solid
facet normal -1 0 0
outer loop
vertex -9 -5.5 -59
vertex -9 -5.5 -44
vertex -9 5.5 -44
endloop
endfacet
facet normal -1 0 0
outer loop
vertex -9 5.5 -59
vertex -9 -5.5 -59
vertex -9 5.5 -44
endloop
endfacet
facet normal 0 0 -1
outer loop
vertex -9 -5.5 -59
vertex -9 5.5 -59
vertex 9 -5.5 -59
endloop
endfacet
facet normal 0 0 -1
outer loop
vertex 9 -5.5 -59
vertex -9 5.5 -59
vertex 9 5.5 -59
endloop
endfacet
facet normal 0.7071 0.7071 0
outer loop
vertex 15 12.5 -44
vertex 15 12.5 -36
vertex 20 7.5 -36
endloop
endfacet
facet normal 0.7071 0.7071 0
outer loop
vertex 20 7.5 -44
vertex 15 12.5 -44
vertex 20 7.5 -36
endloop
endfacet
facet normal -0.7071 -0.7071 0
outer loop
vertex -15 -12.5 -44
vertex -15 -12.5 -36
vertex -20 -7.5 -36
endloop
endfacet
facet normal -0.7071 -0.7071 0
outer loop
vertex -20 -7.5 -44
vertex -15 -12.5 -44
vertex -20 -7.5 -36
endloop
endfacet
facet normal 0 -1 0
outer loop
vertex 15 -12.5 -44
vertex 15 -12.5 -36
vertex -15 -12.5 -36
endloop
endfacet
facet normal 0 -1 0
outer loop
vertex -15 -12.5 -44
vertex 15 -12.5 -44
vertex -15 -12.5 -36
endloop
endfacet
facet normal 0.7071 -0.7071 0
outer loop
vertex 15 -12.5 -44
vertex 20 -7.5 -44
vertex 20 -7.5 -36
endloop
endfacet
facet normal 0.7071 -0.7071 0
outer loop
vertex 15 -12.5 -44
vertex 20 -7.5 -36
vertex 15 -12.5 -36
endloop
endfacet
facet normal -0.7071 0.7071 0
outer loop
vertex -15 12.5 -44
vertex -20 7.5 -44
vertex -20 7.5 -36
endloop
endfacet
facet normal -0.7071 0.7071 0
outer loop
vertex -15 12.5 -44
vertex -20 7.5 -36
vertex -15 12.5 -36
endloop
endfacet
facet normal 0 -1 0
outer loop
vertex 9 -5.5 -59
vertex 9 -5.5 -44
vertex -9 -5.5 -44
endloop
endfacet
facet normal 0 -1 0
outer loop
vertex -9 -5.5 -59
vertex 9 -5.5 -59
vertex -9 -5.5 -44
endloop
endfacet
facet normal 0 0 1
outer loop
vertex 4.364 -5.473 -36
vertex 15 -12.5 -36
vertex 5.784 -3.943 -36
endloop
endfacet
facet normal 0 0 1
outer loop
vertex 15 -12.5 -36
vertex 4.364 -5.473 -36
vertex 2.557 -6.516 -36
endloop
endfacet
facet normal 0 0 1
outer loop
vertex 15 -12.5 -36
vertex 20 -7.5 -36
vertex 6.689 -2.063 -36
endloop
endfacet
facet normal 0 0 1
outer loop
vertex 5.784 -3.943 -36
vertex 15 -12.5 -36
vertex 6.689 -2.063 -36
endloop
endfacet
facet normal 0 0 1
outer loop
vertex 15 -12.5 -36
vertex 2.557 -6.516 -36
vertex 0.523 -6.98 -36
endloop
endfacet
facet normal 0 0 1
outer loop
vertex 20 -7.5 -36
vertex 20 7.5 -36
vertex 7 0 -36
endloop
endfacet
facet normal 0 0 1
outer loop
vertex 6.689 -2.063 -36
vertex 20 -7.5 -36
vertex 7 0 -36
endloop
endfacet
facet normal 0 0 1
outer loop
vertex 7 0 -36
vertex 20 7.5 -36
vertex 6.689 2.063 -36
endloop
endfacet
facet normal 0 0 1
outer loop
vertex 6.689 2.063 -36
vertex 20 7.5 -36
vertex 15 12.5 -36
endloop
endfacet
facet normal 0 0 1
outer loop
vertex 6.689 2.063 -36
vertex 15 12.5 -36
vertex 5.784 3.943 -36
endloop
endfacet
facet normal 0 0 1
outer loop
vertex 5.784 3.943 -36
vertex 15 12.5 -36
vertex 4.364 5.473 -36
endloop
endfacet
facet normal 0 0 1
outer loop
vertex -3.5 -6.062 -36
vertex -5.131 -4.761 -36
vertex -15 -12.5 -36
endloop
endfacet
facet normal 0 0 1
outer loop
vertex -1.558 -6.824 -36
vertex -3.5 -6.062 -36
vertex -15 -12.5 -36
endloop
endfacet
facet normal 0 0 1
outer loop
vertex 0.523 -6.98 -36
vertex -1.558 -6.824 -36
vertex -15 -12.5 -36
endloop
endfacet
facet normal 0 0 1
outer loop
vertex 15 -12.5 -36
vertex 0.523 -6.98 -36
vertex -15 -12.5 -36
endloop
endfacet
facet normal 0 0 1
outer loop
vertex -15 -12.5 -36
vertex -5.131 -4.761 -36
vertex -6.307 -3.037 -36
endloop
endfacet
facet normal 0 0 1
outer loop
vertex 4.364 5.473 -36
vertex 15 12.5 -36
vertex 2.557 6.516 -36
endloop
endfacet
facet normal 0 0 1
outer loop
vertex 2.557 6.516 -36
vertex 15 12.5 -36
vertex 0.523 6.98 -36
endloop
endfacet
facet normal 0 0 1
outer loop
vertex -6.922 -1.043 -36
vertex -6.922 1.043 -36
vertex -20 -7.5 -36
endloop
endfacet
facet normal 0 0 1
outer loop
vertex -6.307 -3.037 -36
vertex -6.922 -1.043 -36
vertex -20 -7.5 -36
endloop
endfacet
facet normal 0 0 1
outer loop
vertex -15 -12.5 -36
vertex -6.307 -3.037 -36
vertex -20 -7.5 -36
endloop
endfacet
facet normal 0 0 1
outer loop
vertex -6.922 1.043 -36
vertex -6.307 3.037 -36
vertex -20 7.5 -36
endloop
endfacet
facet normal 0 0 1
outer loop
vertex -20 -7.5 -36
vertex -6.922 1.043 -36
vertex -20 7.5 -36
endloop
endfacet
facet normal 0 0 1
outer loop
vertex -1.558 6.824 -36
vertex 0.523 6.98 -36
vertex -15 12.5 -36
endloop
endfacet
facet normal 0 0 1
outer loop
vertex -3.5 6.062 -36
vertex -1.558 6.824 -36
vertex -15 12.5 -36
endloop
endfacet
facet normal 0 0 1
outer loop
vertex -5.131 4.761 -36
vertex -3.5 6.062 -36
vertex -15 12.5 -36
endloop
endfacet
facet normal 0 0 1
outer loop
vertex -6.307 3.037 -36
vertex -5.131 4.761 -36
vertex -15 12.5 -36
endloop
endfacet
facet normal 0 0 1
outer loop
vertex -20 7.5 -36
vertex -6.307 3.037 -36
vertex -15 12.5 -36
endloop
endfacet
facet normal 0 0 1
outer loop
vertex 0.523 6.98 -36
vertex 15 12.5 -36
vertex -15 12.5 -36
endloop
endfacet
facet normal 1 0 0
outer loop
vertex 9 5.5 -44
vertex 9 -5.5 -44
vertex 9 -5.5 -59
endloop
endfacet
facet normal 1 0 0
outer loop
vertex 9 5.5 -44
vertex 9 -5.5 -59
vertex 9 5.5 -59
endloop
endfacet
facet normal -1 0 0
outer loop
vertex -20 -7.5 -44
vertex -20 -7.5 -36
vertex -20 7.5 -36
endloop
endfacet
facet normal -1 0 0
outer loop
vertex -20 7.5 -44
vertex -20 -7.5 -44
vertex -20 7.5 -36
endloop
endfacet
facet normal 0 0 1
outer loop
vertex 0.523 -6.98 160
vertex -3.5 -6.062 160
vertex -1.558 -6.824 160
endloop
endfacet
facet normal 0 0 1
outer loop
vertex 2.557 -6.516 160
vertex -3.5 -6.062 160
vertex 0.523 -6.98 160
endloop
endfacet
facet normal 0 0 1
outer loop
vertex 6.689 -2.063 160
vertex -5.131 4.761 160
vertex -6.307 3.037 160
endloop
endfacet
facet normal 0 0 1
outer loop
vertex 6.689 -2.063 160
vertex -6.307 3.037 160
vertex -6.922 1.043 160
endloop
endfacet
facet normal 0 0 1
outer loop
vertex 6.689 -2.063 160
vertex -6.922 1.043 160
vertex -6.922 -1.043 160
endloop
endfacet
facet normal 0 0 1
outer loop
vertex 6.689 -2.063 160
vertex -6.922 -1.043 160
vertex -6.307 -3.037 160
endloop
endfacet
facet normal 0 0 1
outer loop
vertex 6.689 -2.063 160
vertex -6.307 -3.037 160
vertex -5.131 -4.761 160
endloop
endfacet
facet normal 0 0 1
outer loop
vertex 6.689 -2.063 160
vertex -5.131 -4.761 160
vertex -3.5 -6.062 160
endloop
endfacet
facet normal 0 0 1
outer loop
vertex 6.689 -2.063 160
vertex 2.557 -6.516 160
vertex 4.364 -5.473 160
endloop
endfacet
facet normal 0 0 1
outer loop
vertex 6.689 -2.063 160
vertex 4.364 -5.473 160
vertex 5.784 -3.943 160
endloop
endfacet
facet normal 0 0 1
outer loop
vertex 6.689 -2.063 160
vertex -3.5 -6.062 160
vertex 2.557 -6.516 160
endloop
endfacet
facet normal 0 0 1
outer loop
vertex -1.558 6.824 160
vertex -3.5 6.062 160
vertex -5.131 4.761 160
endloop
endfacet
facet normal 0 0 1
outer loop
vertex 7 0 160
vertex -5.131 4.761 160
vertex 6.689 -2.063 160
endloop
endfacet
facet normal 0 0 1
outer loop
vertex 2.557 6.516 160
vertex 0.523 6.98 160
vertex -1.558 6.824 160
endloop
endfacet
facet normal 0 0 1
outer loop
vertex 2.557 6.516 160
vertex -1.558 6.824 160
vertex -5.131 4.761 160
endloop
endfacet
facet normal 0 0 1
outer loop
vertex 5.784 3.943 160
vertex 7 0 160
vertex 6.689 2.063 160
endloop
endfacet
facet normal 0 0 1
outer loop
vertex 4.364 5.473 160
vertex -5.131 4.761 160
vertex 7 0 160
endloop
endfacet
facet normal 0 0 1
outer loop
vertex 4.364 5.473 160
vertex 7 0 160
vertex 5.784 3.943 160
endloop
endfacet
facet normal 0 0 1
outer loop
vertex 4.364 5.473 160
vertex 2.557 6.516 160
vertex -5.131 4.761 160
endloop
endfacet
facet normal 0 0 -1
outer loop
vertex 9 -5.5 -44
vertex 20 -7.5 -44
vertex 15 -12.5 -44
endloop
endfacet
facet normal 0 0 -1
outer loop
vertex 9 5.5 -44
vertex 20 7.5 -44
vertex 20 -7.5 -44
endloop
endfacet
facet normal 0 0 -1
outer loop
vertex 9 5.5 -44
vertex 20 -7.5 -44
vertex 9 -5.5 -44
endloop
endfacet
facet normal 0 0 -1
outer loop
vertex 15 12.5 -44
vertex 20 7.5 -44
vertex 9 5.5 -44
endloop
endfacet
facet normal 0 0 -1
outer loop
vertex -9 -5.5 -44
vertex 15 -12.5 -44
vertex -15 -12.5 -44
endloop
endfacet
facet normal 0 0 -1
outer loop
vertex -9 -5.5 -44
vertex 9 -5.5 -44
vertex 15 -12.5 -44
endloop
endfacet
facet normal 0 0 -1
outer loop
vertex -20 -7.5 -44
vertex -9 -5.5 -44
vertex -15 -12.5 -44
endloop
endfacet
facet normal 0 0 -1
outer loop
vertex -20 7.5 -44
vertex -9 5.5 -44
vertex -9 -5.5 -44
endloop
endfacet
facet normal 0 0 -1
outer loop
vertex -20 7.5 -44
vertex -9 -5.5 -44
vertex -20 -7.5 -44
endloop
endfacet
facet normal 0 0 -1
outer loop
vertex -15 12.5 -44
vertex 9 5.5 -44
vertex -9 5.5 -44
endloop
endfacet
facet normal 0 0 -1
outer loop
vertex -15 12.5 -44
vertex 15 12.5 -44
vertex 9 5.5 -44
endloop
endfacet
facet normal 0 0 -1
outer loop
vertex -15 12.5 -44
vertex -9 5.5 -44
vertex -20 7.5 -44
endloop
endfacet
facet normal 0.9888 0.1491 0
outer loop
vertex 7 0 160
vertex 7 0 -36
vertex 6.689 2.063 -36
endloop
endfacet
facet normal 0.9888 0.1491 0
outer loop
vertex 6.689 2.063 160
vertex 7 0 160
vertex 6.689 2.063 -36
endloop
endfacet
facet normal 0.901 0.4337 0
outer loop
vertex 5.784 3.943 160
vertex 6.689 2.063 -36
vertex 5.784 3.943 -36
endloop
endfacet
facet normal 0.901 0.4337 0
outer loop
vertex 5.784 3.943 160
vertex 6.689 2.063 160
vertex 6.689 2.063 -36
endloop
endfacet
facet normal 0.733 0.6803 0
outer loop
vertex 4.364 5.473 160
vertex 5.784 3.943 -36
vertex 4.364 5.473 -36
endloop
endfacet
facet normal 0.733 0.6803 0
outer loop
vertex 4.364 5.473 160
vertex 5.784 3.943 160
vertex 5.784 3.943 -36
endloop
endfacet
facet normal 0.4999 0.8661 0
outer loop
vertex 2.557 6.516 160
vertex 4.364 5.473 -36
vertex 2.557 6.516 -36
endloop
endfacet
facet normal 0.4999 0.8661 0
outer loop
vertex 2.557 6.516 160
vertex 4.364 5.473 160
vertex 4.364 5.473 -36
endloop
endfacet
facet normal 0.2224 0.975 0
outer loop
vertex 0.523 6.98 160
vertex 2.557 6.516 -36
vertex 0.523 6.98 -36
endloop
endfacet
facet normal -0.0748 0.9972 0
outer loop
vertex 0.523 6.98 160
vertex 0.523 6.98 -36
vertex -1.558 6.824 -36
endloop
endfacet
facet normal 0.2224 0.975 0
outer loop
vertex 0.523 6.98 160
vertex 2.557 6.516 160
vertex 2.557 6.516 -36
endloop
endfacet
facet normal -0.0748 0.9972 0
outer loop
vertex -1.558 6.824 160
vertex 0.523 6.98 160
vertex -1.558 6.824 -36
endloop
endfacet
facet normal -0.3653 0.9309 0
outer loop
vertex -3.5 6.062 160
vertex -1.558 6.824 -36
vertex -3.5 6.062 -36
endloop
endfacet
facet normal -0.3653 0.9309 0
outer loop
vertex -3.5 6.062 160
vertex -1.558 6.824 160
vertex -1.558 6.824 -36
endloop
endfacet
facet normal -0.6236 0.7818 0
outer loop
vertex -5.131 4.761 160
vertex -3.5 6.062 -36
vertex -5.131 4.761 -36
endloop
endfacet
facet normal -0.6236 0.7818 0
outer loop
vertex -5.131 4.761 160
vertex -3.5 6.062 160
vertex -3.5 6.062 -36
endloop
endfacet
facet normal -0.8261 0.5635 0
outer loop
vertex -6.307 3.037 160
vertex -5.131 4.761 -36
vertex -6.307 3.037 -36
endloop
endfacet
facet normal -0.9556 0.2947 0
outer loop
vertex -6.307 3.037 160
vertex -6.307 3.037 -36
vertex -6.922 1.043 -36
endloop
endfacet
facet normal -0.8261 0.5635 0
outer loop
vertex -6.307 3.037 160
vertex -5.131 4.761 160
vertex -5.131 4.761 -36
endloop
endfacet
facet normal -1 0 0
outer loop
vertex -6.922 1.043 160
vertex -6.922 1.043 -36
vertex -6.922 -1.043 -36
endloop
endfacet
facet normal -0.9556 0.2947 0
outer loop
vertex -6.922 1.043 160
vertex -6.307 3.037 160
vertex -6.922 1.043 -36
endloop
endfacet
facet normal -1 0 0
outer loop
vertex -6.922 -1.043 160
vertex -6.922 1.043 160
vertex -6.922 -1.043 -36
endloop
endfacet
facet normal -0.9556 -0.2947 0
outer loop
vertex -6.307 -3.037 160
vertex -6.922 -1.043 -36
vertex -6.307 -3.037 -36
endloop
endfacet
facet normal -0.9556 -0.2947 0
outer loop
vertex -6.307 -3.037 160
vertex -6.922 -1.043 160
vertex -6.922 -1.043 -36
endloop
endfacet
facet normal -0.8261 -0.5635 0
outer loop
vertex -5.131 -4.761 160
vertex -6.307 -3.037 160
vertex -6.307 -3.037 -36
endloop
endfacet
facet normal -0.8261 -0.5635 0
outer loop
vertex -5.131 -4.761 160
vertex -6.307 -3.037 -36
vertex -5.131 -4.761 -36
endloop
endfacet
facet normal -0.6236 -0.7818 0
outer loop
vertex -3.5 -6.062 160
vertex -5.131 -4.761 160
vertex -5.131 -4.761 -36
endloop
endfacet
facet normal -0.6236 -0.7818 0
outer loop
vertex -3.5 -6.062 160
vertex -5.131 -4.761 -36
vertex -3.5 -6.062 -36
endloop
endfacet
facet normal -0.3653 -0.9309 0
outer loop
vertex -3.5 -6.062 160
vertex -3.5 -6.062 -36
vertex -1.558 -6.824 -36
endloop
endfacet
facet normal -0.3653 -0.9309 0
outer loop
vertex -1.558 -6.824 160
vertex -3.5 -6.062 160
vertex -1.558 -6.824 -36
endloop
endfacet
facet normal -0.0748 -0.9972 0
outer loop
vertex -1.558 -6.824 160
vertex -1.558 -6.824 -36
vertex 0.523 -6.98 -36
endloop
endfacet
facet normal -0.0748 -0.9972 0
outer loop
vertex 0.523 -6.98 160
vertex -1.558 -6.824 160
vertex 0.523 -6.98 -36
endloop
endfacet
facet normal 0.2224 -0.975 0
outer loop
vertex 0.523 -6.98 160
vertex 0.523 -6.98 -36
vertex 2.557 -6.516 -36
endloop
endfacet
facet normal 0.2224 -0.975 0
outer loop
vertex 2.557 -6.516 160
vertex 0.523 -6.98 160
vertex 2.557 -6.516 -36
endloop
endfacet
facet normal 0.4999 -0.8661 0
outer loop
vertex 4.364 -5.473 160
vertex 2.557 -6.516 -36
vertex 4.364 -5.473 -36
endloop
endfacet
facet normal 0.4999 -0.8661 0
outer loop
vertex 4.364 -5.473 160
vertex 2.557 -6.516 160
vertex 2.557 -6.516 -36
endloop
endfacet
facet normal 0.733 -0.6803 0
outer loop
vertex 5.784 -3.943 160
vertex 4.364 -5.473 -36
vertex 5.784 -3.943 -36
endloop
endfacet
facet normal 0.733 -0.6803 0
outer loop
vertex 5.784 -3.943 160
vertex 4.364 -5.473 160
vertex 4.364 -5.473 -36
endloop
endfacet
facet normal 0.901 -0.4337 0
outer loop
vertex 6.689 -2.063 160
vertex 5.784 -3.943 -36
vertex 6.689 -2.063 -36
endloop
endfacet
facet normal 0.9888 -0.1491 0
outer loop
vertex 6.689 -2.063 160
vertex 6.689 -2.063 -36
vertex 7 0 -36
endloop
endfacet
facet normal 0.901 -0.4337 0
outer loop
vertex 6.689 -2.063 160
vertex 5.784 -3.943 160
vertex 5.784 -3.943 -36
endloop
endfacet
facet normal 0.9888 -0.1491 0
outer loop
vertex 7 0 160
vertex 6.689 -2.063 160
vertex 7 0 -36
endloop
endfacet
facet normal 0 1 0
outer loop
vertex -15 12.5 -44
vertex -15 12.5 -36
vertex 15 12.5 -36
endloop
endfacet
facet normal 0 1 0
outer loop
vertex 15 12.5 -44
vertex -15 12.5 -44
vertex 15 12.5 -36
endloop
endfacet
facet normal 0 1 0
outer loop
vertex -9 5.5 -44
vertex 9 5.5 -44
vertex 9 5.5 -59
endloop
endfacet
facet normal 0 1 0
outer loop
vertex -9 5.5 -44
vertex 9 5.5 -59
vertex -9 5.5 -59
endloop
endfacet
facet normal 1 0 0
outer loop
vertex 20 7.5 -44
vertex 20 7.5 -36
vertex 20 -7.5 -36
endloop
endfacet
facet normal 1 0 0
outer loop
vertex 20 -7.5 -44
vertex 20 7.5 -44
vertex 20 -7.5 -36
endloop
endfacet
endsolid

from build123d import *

# Parameters (mm, degrees)
SKETCH_1_R             = 7
EXTRUDE_1_DEPTH        = 160
EXTRUDE_1_DEPTH_BACK   = 36
SKETCH_2_R             = 7
EXTRUDE_2_DEPTH        = 8
SKETCH_3_W             = 18
SKETCH_3_H             = 11
EXTRUDE_3_DEPTH        = 15
EXTRUDE_4_DEPTH        = 30
SKETCH_5_W             = 60
SKETCH_5_H             = 40
EXTRUDE_5_DEPTH        = 6
SKETCH_6_W             = 60
SKETCH_6_H             = 6
EXTRUDE_6_DEPTH        = 60
SKETCH_7_W             = 29.455878384
SKETCH_7_H             = 4
EXTRUDE_7_DEPTH        = 8
PATTERN_LINEAR_1_COUNT = 2
PATTERN_LINEAR_1_PITCH = 52
SKETCH_8_W             = 118.40385017
SKETCH_8_H             = 95.184754192
CUT_EXTRUDE_1_DEPTH    = 200


with BuildPart() as part:
    # 草图1 → 凸台-拉伸1 (new body, two sides)
    with BuildSketch(Plane.XY) as extrude_1_sk:
        Circle(SKETCH_1_R)
    extrude(amount=EXTRUDE_1_DEPTH)
    extrude(extrude_1_sk.sketch, amount=-EXTRUDE_1_DEPTH_BACK)

    # 草图2 → 凸台-拉伸2 (add)
    with BuildSketch(Plane(origin=(0, 0, -36), x_dir=(-1, 0, 0), z_dir=(0, 0, -1))):
        Polygon((20, 7.5), (15, 12.5), (-15, 12.5), (-20, 7.5), (-20, -7.5), (-15, -12.5), (15, -12.5), (20, -7.5), align=None)
        Circle(SKETCH_2_R, mode=Mode.SUBTRACT)
        Circle(SKETCH_2_R)
    extrude(amount=EXTRUDE_2_DEPTH)

    # 草图3 → 凸台-拉伸3 (add)
    with BuildSketch(Plane(origin=(0, 0, -44), x_dir=(-1, 0, 0), z_dir=(0, 0, -1))):
        Rectangle(SKETCH_3_W, SKETCH_3_H)
    extrude(amount=EXTRUDE_3_DEPTH)

    # 草图4 → 凸台-拉伸4 (add)
    with BuildSketch(Plane(origin=(0, 0, -59), x_dir=(-1, 0, 0), z_dir=(0, 0, -1))):
        with BuildLine():
            Line((-15, -12.5), (-15, 12.5))
            ThreePointArc((-15, 12.5), (-27.5, 0), (-15, -12.5))
        make_face()
        with BuildLine():
            ThreePointArc((-3.77502784, 5.5), (-8.385621722, 10.606601718), (-15, 12.5))
            Line((-15, 12.5), (-15, -12.5))
            ThreePointArc((-15, -12.5), (-8.385621722, -10.606601718), (-3.77502784, -5.5))
            Line((-3.77502784, -5.5), (-9, -5.5))
            Line((-9, -5.5), (-9, 5.5))
            Line((-9, 5.5), (-3.77502784, 5.5))
        make_face()
        with BuildLine():
            ThreePointArc((-2.5, 0), (-2.822928267, 2.822928267), (-3.77502784, 5.5))
            Line((-3.77502784, 5.5), (-9, 5.5))
            Line((-9, 5.5), (-9, -5.5))
            Line((-9, -5.5), (-3.77502784, -5.5))
            ThreePointArc((-3.77502784, -5.5), (-2.822928267, -2.822928267), (-2.5, 0))
        make_face()
        with BuildLine():
            ThreePointArc((3.77502784, -5.5), (2.5, 0), (3.77502784, 5.5))
            Line((3.77502784, 5.5), (-3.77502784, 5.5))
            ThreePointArc((-3.77502784, 5.5), (-2.822928267, 2.822928267), (-2.5, 0))
            ThreePointArc((-2.5, 0), (-2.822928267, -2.822928267), (-3.77502784, -5.5))
            Line((-3.77502784, -5.5), (3.77502784, -5.5))
        make_face()
        with BuildLine():
            Line((9, 5.5), (3.77502784, 5.5))
            ThreePointArc((3.77502784, 5.5), (2.5, 0), (3.77502784, -5.5))
            Line((3.77502784, -5.5), (9, -5.5))
            Line((9, -5.5), (9, 5.5))
        make_face()
        with BuildLine():
            Line((15, -12.5), (15, 12.5))
            ThreePointArc((15, 12.5), (8.385621722, 10.606601718), (3.77502784, 5.5))
            Line((3.77502784, 5.5), (9, 5.5))
            Line((9, 5.5), (9, -5.5))
            Line((9, -5.5), (3.77502784, -5.5))
            ThreePointArc((3.77502784, -5.5), (8.385621722, -10.606601718), (15, -12.5))
        make_face()
        with BuildLine():
            ThreePointArc((27.5, 0), (23.838834765, 8.838834765), (15, 12.5))
            Line((15, 12.5), (15, -12.5))
            ThreePointArc((15, -12.5), (23.838834765, -8.838834765), (27.5, 0))
        make_face()
        with BuildLine():
            Line((-15, -12.5), (15, -12.5))
            ThreePointArc((15, -12.5), (8.385621722, -10.606601718), (3.77502784, -5.5))
            Line((3.77502784, -5.5), (-3.77502784, -5.5))
            ThreePointArc((-3.77502784, -5.5), (-8.385621722, -10.606601718), (-15, -12.5))
        make_face()
        with BuildLine():
            ThreePointArc((3.77502784, 5.5), (8.385621722, 10.606601718), (15, 12.5))
            Line((15, 12.5), (-15, 12.5))
            ThreePointArc((-15, 12.5), (-8.385621722, 10.606601718), (-3.77502784, 5.5))
            Line((-3.77502784, 5.5), (3.77502784, 5.5))
        make_face()
    extrude(amount=EXTRUDE_4_DEPTH)

    # 草图5 → 凸台-拉伸5 (add)
    with BuildSketch(Plane(origin=(0, 0, -89), x_dir=(-1, 0, 0), z_dir=(0, 0, -1))):
        Rectangle(SKETCH_5_W, SKETCH_5_H)
    extrude(amount=EXTRUDE_5_DEPTH)

    # 草图6 → 凸台-拉伸6 (add)
    with BuildSketch(Plane(origin=(0, 0, -95), x_dir=(-1, 0, 0), z_dir=(0, 0, -1))):
        with Locations((0, 17)):
            Rectangle(SKETCH_6_W, SKETCH_6_H)
        with Locations((0, -17)):
            Rectangle(SKETCH_6_W, SKETCH_6_H)
    extrude(amount=EXTRUDE_6_DEPTH)

    # 草图7 → 凸台-拉伸7 (add)
    with BuildSketch(Plane.ZY.offset(30)):
        Polygon((-125, 8), (-125, 14), (-155, 14), (-160, 14), (-160, 8), align=None)
        Polygon((-125, -8), (-160, -8), (-160, -14), (-155, -14), (-125, -14), align=None)
        Polygon((-160, 8), (-160, 14), (-166, 14), (-166, 4), (-166, 0), (-166, -4), (-166, -14), (-160, -14), (-160, -8), align=None)
        with Locations((-180.727939192, -2)):
            Rectangle(SKETCH_7_W, SKETCH_7_H)
        with Locations((-180.727939192, 2)):
            Rectangle(SKETCH_7_W, SKETCH_7_H)
    extrude_7 = extrude(amount=-EXTRUDE_7_DEPTH)

    # 阵列(线性)1: 凸台-拉伸7 ×2
    with Locations(*[(i * PATTERN_LINEAR_1_PITCH, 0, 0) for i in range(1, PATTERN_LINEAR_1_COUNT)]):
        add(extrude_7)

    # 草图8 → 切除-拉伸1 (cut)
    with BuildSketch(Plane.XY.offset(-59)):
        Rectangle(SKETCH_8_W, SKETCH_8_H)
    extrude(amount=-CUT_EXTRUDE_1_DEPTH, mode=Mode.SUBTRACT)


solid = part.part
